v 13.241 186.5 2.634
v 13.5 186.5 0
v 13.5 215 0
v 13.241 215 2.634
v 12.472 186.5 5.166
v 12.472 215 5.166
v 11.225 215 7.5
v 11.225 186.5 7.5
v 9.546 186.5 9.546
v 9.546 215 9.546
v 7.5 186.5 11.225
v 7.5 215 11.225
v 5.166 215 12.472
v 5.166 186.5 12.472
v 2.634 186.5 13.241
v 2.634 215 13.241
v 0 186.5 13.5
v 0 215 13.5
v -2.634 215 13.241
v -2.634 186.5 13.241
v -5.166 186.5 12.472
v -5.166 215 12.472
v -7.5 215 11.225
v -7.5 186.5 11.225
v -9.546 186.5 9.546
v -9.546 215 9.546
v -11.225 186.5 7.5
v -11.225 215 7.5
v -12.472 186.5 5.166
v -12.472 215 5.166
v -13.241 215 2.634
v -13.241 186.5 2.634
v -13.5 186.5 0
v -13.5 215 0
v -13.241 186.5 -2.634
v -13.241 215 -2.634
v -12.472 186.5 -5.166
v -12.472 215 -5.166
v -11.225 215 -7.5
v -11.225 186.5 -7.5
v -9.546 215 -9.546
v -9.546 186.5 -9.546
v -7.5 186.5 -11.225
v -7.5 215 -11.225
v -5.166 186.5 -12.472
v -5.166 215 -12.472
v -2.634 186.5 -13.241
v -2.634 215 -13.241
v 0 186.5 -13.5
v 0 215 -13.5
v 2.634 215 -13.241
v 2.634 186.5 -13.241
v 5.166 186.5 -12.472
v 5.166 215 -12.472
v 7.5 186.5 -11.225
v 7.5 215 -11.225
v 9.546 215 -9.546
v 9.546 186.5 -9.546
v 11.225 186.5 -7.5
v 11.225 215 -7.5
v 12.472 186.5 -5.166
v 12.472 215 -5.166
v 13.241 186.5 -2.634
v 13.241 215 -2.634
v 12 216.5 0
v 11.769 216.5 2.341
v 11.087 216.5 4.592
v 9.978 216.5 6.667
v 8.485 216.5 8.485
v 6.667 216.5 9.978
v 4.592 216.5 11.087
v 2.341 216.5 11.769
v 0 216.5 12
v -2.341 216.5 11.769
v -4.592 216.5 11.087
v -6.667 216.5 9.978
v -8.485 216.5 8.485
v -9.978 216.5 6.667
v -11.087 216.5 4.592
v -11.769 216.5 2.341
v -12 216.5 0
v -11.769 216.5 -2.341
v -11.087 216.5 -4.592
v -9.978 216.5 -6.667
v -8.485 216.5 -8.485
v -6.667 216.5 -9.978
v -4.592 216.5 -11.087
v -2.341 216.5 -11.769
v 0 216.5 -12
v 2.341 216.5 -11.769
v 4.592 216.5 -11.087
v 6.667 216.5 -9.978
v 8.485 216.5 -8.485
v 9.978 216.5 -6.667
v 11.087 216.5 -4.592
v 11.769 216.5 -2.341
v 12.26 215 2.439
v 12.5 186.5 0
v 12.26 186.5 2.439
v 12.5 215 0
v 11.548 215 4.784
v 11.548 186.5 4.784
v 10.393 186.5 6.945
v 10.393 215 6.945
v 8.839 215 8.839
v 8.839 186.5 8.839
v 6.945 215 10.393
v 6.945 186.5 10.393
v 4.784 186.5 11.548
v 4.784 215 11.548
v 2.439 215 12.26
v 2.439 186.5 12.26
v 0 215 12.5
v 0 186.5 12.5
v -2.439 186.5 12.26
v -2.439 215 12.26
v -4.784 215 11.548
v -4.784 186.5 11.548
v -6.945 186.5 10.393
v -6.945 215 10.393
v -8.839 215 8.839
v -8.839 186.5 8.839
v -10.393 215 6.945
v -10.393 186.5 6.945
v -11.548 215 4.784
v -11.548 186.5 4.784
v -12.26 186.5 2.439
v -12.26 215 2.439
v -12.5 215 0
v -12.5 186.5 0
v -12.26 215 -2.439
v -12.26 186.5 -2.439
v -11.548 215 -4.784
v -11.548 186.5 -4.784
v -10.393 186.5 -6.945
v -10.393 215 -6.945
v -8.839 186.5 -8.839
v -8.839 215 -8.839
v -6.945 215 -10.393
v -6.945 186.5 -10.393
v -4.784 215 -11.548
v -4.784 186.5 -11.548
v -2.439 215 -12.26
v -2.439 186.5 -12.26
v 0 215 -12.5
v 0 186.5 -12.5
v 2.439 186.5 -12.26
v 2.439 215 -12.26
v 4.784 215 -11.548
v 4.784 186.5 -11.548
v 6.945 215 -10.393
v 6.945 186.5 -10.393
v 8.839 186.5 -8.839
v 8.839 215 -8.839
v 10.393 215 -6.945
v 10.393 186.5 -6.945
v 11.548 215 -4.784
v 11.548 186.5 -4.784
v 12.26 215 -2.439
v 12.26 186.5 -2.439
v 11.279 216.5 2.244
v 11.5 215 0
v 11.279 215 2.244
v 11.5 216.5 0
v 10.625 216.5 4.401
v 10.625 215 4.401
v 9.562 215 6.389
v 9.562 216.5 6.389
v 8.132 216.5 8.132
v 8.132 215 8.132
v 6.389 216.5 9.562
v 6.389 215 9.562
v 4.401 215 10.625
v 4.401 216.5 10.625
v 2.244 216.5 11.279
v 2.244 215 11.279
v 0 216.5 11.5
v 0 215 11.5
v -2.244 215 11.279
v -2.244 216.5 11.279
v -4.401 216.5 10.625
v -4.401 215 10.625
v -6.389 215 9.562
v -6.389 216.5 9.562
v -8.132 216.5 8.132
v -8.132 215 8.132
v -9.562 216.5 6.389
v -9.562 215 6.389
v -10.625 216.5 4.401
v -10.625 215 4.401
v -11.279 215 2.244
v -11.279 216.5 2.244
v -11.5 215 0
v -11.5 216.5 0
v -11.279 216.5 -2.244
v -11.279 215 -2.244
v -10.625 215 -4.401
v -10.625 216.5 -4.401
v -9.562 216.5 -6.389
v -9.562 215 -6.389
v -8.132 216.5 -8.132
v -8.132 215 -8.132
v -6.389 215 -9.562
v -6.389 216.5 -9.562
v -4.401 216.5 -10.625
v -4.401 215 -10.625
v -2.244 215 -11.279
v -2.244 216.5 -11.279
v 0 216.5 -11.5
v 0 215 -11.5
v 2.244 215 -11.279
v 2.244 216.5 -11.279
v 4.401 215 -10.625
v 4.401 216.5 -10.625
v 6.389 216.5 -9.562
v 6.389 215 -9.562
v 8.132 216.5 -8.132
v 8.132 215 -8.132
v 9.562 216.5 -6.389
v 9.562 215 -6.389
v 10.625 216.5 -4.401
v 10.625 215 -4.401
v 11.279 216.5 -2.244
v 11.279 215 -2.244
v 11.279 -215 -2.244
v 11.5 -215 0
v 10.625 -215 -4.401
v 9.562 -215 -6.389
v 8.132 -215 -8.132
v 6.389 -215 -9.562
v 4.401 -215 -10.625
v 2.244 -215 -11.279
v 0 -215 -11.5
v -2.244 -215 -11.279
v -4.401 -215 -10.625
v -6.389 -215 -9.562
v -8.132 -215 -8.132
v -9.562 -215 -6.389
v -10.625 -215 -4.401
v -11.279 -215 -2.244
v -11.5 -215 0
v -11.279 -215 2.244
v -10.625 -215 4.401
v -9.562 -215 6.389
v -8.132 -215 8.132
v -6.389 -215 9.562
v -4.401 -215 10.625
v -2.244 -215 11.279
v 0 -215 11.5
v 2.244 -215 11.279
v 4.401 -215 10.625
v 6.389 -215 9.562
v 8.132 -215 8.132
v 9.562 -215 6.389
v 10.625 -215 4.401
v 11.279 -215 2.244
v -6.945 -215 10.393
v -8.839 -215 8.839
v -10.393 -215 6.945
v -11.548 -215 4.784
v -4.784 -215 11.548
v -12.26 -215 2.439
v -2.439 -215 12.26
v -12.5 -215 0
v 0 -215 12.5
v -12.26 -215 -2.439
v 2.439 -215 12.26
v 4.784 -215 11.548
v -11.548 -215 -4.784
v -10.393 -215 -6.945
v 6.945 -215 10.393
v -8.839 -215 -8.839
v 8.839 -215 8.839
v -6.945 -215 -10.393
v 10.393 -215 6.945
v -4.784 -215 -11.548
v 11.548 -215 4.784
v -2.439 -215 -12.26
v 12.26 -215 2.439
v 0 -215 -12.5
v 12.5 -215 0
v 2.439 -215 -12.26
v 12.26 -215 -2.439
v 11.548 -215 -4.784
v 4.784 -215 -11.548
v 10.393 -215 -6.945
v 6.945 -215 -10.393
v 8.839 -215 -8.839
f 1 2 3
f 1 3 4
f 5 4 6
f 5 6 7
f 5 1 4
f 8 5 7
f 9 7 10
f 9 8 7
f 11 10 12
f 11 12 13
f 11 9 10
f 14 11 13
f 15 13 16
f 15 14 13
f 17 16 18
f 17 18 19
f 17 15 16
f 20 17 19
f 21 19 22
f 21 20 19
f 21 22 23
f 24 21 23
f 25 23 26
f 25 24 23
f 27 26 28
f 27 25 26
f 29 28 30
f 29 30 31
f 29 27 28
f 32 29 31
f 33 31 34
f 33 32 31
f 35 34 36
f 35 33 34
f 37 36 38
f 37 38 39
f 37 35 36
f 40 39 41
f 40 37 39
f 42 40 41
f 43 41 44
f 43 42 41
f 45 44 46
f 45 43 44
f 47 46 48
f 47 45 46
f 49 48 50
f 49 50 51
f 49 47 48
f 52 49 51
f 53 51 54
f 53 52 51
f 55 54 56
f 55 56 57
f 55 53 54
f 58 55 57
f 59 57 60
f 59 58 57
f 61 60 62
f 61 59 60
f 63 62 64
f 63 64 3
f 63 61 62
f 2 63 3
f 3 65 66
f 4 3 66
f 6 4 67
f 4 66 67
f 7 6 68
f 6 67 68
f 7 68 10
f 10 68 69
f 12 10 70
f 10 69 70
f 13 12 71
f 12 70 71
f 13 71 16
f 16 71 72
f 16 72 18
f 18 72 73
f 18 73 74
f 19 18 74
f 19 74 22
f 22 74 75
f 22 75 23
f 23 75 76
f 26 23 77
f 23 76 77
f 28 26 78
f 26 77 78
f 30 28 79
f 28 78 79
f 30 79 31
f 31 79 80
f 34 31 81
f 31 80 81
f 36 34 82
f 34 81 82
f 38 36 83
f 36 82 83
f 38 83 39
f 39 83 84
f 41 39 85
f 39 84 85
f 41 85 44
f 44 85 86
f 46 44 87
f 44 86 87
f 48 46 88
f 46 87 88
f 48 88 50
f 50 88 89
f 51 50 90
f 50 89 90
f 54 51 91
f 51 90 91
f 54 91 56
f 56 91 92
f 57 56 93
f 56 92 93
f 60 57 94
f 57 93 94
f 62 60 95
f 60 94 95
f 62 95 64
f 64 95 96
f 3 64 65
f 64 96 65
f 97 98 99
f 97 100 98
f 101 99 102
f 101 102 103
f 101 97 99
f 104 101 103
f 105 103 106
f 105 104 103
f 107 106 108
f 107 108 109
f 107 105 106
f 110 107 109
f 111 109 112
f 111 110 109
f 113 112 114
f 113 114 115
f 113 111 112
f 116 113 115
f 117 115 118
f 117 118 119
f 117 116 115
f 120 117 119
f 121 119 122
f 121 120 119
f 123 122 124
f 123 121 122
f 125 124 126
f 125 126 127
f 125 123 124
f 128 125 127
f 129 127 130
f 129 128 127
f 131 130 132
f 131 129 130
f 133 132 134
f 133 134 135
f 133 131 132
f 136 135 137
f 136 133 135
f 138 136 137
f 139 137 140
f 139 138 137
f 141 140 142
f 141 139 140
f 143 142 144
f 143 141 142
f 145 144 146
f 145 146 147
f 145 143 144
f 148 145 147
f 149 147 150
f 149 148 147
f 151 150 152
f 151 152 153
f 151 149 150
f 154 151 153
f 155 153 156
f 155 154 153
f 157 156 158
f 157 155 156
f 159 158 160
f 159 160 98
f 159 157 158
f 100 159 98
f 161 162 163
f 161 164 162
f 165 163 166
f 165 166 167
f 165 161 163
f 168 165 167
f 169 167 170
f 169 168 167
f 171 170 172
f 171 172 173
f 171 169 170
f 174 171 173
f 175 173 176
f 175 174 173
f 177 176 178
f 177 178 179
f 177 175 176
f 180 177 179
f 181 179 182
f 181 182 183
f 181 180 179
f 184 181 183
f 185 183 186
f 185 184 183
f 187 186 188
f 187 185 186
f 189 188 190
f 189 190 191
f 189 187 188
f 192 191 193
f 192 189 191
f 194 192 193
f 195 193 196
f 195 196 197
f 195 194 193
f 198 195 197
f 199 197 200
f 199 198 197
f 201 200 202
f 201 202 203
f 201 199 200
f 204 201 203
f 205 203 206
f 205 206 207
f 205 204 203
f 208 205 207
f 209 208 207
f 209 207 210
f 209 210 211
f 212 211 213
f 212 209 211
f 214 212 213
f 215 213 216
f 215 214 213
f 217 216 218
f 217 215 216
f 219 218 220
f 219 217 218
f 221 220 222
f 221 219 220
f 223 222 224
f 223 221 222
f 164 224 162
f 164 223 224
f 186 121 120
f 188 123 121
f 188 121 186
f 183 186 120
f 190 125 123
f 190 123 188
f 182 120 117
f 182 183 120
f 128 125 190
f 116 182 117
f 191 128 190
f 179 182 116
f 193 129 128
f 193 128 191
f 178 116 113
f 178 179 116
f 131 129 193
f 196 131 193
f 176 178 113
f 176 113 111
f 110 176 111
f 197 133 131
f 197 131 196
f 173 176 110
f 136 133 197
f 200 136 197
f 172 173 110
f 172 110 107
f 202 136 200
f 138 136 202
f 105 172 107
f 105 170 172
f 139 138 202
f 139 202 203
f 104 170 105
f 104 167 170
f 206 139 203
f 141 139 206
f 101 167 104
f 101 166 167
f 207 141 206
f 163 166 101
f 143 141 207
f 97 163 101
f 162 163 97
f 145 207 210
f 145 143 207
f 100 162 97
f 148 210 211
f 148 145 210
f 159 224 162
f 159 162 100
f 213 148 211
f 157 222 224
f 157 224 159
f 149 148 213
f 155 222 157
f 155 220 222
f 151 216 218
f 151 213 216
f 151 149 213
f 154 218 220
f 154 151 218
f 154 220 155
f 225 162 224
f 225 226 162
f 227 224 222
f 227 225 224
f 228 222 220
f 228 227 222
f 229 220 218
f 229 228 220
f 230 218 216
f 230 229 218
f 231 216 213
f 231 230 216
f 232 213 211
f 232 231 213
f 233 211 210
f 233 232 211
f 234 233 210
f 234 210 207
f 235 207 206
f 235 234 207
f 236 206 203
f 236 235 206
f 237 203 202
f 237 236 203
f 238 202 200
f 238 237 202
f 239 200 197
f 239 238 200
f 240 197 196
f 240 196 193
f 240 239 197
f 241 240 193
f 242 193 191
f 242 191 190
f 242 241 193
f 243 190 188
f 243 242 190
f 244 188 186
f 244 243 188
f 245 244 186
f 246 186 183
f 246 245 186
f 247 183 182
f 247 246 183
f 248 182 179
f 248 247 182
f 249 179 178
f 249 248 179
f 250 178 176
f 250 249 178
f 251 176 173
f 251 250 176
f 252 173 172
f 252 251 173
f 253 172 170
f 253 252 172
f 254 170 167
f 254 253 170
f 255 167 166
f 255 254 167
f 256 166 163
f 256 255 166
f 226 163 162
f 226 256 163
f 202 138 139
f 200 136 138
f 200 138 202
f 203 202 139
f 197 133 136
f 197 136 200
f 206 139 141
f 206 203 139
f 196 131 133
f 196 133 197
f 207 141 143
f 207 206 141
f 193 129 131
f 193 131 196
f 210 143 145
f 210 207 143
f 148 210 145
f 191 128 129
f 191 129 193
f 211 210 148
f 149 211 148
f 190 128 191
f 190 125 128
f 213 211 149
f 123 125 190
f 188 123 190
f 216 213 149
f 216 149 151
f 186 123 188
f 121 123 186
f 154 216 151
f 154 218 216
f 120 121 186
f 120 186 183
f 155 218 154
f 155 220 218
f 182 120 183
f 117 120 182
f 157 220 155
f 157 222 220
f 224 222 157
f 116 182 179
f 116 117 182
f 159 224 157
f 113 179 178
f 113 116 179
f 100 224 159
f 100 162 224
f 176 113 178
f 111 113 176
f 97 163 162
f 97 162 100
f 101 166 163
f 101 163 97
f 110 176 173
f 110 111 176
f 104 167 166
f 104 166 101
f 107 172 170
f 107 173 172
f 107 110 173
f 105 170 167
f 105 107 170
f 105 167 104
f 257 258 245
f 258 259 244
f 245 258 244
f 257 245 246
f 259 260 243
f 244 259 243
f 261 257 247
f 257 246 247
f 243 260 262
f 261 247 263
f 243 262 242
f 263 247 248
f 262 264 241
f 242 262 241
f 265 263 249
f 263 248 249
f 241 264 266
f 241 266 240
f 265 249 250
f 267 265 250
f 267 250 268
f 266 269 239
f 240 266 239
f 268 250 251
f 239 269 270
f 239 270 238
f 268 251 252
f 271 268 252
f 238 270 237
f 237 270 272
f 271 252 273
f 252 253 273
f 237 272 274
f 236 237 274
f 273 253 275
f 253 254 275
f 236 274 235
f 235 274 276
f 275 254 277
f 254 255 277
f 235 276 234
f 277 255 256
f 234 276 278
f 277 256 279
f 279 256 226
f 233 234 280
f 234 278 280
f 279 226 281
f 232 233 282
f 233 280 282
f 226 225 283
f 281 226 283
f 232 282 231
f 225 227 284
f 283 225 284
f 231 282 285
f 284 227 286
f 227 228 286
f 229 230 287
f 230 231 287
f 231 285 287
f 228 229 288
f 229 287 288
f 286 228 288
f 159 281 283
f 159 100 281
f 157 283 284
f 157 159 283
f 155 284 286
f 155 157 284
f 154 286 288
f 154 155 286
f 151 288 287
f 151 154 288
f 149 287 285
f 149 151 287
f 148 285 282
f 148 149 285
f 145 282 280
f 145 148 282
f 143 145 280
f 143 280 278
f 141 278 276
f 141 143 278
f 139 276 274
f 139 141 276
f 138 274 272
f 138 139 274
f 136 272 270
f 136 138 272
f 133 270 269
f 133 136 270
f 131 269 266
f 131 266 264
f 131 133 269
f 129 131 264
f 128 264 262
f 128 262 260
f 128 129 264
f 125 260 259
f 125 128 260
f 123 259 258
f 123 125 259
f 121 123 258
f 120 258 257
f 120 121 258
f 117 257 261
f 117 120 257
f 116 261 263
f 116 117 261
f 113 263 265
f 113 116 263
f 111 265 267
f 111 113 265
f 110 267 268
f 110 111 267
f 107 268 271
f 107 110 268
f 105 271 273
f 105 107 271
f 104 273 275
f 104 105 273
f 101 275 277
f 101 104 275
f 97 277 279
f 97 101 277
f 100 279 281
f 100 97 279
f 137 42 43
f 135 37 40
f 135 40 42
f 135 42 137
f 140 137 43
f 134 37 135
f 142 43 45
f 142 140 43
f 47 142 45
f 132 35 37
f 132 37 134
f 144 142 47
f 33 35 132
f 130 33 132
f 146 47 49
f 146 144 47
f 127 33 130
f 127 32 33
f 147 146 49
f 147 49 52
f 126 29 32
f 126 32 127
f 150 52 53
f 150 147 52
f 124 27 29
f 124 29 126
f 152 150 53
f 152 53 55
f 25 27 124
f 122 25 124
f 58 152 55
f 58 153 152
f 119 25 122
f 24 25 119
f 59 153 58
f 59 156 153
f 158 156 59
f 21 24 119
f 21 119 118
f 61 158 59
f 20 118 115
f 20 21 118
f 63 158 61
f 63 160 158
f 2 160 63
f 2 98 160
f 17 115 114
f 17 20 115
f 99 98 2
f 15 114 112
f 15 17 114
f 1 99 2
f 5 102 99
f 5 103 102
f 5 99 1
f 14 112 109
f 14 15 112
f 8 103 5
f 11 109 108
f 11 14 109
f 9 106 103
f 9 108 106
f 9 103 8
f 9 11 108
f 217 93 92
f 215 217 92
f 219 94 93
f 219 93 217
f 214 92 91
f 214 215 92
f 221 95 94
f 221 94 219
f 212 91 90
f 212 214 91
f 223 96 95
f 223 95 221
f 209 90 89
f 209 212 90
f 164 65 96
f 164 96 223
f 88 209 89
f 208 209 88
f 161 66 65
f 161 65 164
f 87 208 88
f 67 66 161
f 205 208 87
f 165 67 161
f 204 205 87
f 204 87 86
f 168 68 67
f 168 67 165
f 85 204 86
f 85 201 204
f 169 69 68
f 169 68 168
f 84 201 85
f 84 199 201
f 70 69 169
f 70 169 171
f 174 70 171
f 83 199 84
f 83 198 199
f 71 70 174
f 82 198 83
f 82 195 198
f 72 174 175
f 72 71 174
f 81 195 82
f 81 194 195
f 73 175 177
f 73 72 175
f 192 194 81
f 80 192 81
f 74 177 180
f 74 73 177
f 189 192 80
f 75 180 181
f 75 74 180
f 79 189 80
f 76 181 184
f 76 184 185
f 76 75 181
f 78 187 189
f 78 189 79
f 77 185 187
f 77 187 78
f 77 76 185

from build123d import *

# Parameters (mm, degrees)
SKETCH1_R      = 12.5
SKETCH1_R_2    = 11.5
EXTRUDE1_DEPTH = 215
CHAMFER1_SIZE  = 1.5


with BuildPart() as part:
    # Sketch1 → Extrude1 (new body, symmetric)
    with BuildSketch(Plane(origin=(0, 0, 0), x_dir=(1, 0, 0), z_dir=(0, 1, 0))):
        Circle(SKETCH1_R)
        Circle(SKETCH1_R_2, mode=Mode.SUBTRACT)
    extrude(amount=EXTRUDE1_DEPTH, both=True)


with BuildPart() as body_2:
    # Sketch2 → Revolve1 (revolve)
    with BuildSketch(Plane.XY):
        Polygon((13.5, 216.5), (13.5, 186.5), (12.5, 186.5), (12.5, 215), (11.5, 215), (11.5, 216.5), align=None)
    revolve(axis=Axis((0, 224.324804611, 0), (0, -1, 0)))

    # Chamfer1
    chamfer1_edges = [body_2.edges().sort_by_distance(p)[0] for p in [
        (-13.5, 216.5, 0),
    ]]
    chamfer(chamfer1_edges, length=CHAMFER1_SIZE)


solid = Compound([part.part, body_2.part])
